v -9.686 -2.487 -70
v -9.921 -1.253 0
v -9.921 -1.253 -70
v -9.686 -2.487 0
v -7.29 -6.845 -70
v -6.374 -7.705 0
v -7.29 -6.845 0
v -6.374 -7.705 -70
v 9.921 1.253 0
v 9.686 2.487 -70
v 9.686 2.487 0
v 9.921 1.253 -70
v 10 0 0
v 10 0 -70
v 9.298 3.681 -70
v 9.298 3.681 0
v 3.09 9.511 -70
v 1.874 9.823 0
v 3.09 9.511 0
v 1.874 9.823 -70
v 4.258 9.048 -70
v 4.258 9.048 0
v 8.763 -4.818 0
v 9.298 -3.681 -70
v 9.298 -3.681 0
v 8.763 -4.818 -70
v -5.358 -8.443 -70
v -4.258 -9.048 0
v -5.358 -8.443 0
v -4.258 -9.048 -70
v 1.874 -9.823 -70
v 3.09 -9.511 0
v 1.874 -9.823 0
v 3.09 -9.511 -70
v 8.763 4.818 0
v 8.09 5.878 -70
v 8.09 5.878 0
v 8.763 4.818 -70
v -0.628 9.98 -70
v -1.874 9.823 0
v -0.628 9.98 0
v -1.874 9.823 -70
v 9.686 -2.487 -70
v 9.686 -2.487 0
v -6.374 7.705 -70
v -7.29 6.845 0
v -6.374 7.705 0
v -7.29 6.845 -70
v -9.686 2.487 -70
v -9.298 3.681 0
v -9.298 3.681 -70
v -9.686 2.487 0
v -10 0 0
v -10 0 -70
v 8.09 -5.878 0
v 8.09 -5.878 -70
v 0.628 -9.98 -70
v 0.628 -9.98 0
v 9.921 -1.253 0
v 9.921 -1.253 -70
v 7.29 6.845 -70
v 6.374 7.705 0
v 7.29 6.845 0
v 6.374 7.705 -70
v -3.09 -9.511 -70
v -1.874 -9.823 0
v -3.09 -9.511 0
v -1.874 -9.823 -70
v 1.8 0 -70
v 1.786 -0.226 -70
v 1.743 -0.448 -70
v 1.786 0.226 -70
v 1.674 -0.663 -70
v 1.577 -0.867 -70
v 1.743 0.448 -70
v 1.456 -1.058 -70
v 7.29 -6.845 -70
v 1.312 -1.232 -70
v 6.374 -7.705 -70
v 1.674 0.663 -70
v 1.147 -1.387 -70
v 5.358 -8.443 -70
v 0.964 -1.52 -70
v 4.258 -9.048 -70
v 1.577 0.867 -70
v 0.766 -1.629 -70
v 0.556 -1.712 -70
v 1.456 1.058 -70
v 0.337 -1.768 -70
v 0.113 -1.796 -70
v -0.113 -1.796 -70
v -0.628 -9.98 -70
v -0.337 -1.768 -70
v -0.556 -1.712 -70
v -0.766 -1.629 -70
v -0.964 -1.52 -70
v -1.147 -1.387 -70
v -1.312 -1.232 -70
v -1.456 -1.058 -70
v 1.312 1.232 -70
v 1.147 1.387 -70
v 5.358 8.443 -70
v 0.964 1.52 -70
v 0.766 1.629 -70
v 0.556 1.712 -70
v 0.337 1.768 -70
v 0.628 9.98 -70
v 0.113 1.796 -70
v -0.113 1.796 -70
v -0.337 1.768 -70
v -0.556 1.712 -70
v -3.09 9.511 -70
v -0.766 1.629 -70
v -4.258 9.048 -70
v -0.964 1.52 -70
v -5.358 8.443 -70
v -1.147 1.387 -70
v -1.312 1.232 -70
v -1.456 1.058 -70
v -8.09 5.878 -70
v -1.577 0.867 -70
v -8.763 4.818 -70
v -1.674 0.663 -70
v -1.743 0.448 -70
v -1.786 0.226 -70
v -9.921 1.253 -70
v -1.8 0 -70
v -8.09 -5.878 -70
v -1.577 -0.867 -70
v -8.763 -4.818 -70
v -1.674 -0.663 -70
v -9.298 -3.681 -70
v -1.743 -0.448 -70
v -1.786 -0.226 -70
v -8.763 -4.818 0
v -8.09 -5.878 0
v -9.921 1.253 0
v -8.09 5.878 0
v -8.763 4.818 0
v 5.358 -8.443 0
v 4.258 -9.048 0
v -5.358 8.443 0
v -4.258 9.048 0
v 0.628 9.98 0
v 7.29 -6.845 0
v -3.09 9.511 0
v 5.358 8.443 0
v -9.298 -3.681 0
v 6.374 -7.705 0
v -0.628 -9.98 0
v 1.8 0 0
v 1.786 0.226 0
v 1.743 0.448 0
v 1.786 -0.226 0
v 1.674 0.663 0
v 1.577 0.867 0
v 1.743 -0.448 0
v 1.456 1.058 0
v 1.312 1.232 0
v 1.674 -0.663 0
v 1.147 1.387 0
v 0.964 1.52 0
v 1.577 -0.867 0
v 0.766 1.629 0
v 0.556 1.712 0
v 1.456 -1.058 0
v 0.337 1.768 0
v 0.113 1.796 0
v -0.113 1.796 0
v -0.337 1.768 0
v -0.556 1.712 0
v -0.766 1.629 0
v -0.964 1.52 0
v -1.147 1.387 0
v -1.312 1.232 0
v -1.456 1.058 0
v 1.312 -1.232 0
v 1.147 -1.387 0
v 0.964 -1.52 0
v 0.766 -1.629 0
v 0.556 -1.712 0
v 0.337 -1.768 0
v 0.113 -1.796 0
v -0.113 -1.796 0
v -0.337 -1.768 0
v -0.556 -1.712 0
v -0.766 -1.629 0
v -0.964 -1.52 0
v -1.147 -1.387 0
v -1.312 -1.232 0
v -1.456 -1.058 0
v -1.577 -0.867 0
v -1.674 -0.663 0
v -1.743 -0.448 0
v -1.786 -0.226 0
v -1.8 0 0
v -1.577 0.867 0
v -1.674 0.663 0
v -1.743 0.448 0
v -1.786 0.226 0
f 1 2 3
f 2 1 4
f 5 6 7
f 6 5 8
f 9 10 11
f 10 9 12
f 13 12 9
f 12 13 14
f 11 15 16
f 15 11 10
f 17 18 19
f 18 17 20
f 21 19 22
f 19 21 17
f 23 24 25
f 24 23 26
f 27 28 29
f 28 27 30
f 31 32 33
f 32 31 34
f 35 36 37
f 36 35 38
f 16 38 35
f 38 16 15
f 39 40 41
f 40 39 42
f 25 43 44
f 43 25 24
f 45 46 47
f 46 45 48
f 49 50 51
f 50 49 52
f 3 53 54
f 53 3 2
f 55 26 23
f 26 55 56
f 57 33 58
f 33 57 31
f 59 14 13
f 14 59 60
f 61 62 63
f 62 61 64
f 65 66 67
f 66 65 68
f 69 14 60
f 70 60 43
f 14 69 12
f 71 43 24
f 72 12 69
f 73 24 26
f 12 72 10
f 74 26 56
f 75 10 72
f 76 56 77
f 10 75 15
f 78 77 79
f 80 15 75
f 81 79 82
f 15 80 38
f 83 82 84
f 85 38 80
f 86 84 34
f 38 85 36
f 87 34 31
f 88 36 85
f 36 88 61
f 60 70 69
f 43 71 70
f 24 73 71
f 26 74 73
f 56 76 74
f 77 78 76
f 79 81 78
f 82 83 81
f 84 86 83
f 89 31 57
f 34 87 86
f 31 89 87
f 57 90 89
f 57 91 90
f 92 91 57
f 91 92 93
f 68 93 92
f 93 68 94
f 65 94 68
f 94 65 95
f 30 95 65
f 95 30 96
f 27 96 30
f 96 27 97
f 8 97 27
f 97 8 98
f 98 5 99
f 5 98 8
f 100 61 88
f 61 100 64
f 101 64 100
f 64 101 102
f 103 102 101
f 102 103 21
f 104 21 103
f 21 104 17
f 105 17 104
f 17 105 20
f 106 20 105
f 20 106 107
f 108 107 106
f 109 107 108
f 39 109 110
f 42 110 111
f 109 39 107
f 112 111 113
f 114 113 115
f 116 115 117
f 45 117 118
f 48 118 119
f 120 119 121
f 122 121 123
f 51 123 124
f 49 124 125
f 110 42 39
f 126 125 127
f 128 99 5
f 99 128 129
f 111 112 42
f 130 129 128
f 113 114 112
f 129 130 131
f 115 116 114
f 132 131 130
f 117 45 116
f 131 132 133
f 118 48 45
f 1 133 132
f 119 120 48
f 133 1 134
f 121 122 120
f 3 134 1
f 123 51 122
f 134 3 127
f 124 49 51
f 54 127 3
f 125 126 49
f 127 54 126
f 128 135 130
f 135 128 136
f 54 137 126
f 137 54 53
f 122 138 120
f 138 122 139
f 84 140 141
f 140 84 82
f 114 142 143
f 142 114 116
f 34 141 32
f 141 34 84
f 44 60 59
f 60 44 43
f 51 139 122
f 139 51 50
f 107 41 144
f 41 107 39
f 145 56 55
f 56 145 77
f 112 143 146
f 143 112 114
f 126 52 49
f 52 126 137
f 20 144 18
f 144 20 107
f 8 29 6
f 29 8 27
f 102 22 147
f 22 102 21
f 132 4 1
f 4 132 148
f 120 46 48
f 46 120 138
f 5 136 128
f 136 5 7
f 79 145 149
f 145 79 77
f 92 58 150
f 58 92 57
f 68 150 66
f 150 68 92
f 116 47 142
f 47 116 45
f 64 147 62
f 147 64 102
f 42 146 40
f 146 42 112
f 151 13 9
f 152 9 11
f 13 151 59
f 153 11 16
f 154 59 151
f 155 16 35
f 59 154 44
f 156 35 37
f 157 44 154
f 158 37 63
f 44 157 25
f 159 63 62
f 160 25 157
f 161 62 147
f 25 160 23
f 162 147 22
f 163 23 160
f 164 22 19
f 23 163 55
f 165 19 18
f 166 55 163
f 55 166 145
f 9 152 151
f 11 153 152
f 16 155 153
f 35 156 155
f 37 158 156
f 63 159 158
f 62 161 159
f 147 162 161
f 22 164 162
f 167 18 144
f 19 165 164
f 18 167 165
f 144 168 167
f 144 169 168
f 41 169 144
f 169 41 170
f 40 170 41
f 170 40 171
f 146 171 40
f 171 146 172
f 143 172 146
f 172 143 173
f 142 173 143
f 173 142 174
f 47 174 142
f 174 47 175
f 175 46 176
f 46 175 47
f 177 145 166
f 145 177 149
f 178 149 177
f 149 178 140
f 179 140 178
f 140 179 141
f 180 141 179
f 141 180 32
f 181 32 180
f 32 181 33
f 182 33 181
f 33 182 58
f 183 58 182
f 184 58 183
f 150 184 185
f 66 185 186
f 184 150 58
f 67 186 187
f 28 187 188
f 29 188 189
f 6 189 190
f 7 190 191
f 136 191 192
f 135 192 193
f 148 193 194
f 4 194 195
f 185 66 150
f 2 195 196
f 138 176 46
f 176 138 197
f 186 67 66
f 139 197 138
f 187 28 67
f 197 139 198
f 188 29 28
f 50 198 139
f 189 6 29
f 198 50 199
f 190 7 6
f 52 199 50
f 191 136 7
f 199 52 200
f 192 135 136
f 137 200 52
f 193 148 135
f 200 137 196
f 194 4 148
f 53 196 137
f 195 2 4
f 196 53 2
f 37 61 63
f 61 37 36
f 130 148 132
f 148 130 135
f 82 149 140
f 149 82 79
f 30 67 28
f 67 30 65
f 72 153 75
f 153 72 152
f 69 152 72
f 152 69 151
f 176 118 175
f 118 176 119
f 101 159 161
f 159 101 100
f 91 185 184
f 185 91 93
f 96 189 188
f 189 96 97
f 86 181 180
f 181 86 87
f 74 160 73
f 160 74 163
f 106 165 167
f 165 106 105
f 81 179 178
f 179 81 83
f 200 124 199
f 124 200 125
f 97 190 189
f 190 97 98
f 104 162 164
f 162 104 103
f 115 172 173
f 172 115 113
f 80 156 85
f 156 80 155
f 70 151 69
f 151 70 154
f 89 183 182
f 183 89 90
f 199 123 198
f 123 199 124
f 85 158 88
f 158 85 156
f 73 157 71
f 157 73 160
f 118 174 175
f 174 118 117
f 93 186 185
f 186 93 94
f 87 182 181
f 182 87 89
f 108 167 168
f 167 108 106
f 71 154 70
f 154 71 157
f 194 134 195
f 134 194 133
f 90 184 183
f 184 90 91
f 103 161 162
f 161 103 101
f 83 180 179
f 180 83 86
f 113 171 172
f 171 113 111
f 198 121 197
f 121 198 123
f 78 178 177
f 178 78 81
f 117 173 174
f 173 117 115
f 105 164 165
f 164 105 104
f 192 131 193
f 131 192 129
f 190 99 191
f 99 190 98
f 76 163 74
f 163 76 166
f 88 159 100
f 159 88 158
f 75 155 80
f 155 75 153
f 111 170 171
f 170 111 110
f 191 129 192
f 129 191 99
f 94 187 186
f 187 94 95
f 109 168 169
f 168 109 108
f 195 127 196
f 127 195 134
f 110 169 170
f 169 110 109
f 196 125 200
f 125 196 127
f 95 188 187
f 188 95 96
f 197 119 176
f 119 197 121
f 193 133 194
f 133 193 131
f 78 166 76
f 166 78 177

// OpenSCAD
$fn = 50;


difference() {
	union() {
		translate(v = [0, 0, -70.0000000000]) {
			cylinder(h = 70, r = 10.0000000000);
		}
		cylinder(h = 0, r = 16.0000000000);
	}
	union() {
		#translate(v = [0, 0, -70]) {
			cylinder(h = 70, r = 1.8000000000);
		}
	}
}
